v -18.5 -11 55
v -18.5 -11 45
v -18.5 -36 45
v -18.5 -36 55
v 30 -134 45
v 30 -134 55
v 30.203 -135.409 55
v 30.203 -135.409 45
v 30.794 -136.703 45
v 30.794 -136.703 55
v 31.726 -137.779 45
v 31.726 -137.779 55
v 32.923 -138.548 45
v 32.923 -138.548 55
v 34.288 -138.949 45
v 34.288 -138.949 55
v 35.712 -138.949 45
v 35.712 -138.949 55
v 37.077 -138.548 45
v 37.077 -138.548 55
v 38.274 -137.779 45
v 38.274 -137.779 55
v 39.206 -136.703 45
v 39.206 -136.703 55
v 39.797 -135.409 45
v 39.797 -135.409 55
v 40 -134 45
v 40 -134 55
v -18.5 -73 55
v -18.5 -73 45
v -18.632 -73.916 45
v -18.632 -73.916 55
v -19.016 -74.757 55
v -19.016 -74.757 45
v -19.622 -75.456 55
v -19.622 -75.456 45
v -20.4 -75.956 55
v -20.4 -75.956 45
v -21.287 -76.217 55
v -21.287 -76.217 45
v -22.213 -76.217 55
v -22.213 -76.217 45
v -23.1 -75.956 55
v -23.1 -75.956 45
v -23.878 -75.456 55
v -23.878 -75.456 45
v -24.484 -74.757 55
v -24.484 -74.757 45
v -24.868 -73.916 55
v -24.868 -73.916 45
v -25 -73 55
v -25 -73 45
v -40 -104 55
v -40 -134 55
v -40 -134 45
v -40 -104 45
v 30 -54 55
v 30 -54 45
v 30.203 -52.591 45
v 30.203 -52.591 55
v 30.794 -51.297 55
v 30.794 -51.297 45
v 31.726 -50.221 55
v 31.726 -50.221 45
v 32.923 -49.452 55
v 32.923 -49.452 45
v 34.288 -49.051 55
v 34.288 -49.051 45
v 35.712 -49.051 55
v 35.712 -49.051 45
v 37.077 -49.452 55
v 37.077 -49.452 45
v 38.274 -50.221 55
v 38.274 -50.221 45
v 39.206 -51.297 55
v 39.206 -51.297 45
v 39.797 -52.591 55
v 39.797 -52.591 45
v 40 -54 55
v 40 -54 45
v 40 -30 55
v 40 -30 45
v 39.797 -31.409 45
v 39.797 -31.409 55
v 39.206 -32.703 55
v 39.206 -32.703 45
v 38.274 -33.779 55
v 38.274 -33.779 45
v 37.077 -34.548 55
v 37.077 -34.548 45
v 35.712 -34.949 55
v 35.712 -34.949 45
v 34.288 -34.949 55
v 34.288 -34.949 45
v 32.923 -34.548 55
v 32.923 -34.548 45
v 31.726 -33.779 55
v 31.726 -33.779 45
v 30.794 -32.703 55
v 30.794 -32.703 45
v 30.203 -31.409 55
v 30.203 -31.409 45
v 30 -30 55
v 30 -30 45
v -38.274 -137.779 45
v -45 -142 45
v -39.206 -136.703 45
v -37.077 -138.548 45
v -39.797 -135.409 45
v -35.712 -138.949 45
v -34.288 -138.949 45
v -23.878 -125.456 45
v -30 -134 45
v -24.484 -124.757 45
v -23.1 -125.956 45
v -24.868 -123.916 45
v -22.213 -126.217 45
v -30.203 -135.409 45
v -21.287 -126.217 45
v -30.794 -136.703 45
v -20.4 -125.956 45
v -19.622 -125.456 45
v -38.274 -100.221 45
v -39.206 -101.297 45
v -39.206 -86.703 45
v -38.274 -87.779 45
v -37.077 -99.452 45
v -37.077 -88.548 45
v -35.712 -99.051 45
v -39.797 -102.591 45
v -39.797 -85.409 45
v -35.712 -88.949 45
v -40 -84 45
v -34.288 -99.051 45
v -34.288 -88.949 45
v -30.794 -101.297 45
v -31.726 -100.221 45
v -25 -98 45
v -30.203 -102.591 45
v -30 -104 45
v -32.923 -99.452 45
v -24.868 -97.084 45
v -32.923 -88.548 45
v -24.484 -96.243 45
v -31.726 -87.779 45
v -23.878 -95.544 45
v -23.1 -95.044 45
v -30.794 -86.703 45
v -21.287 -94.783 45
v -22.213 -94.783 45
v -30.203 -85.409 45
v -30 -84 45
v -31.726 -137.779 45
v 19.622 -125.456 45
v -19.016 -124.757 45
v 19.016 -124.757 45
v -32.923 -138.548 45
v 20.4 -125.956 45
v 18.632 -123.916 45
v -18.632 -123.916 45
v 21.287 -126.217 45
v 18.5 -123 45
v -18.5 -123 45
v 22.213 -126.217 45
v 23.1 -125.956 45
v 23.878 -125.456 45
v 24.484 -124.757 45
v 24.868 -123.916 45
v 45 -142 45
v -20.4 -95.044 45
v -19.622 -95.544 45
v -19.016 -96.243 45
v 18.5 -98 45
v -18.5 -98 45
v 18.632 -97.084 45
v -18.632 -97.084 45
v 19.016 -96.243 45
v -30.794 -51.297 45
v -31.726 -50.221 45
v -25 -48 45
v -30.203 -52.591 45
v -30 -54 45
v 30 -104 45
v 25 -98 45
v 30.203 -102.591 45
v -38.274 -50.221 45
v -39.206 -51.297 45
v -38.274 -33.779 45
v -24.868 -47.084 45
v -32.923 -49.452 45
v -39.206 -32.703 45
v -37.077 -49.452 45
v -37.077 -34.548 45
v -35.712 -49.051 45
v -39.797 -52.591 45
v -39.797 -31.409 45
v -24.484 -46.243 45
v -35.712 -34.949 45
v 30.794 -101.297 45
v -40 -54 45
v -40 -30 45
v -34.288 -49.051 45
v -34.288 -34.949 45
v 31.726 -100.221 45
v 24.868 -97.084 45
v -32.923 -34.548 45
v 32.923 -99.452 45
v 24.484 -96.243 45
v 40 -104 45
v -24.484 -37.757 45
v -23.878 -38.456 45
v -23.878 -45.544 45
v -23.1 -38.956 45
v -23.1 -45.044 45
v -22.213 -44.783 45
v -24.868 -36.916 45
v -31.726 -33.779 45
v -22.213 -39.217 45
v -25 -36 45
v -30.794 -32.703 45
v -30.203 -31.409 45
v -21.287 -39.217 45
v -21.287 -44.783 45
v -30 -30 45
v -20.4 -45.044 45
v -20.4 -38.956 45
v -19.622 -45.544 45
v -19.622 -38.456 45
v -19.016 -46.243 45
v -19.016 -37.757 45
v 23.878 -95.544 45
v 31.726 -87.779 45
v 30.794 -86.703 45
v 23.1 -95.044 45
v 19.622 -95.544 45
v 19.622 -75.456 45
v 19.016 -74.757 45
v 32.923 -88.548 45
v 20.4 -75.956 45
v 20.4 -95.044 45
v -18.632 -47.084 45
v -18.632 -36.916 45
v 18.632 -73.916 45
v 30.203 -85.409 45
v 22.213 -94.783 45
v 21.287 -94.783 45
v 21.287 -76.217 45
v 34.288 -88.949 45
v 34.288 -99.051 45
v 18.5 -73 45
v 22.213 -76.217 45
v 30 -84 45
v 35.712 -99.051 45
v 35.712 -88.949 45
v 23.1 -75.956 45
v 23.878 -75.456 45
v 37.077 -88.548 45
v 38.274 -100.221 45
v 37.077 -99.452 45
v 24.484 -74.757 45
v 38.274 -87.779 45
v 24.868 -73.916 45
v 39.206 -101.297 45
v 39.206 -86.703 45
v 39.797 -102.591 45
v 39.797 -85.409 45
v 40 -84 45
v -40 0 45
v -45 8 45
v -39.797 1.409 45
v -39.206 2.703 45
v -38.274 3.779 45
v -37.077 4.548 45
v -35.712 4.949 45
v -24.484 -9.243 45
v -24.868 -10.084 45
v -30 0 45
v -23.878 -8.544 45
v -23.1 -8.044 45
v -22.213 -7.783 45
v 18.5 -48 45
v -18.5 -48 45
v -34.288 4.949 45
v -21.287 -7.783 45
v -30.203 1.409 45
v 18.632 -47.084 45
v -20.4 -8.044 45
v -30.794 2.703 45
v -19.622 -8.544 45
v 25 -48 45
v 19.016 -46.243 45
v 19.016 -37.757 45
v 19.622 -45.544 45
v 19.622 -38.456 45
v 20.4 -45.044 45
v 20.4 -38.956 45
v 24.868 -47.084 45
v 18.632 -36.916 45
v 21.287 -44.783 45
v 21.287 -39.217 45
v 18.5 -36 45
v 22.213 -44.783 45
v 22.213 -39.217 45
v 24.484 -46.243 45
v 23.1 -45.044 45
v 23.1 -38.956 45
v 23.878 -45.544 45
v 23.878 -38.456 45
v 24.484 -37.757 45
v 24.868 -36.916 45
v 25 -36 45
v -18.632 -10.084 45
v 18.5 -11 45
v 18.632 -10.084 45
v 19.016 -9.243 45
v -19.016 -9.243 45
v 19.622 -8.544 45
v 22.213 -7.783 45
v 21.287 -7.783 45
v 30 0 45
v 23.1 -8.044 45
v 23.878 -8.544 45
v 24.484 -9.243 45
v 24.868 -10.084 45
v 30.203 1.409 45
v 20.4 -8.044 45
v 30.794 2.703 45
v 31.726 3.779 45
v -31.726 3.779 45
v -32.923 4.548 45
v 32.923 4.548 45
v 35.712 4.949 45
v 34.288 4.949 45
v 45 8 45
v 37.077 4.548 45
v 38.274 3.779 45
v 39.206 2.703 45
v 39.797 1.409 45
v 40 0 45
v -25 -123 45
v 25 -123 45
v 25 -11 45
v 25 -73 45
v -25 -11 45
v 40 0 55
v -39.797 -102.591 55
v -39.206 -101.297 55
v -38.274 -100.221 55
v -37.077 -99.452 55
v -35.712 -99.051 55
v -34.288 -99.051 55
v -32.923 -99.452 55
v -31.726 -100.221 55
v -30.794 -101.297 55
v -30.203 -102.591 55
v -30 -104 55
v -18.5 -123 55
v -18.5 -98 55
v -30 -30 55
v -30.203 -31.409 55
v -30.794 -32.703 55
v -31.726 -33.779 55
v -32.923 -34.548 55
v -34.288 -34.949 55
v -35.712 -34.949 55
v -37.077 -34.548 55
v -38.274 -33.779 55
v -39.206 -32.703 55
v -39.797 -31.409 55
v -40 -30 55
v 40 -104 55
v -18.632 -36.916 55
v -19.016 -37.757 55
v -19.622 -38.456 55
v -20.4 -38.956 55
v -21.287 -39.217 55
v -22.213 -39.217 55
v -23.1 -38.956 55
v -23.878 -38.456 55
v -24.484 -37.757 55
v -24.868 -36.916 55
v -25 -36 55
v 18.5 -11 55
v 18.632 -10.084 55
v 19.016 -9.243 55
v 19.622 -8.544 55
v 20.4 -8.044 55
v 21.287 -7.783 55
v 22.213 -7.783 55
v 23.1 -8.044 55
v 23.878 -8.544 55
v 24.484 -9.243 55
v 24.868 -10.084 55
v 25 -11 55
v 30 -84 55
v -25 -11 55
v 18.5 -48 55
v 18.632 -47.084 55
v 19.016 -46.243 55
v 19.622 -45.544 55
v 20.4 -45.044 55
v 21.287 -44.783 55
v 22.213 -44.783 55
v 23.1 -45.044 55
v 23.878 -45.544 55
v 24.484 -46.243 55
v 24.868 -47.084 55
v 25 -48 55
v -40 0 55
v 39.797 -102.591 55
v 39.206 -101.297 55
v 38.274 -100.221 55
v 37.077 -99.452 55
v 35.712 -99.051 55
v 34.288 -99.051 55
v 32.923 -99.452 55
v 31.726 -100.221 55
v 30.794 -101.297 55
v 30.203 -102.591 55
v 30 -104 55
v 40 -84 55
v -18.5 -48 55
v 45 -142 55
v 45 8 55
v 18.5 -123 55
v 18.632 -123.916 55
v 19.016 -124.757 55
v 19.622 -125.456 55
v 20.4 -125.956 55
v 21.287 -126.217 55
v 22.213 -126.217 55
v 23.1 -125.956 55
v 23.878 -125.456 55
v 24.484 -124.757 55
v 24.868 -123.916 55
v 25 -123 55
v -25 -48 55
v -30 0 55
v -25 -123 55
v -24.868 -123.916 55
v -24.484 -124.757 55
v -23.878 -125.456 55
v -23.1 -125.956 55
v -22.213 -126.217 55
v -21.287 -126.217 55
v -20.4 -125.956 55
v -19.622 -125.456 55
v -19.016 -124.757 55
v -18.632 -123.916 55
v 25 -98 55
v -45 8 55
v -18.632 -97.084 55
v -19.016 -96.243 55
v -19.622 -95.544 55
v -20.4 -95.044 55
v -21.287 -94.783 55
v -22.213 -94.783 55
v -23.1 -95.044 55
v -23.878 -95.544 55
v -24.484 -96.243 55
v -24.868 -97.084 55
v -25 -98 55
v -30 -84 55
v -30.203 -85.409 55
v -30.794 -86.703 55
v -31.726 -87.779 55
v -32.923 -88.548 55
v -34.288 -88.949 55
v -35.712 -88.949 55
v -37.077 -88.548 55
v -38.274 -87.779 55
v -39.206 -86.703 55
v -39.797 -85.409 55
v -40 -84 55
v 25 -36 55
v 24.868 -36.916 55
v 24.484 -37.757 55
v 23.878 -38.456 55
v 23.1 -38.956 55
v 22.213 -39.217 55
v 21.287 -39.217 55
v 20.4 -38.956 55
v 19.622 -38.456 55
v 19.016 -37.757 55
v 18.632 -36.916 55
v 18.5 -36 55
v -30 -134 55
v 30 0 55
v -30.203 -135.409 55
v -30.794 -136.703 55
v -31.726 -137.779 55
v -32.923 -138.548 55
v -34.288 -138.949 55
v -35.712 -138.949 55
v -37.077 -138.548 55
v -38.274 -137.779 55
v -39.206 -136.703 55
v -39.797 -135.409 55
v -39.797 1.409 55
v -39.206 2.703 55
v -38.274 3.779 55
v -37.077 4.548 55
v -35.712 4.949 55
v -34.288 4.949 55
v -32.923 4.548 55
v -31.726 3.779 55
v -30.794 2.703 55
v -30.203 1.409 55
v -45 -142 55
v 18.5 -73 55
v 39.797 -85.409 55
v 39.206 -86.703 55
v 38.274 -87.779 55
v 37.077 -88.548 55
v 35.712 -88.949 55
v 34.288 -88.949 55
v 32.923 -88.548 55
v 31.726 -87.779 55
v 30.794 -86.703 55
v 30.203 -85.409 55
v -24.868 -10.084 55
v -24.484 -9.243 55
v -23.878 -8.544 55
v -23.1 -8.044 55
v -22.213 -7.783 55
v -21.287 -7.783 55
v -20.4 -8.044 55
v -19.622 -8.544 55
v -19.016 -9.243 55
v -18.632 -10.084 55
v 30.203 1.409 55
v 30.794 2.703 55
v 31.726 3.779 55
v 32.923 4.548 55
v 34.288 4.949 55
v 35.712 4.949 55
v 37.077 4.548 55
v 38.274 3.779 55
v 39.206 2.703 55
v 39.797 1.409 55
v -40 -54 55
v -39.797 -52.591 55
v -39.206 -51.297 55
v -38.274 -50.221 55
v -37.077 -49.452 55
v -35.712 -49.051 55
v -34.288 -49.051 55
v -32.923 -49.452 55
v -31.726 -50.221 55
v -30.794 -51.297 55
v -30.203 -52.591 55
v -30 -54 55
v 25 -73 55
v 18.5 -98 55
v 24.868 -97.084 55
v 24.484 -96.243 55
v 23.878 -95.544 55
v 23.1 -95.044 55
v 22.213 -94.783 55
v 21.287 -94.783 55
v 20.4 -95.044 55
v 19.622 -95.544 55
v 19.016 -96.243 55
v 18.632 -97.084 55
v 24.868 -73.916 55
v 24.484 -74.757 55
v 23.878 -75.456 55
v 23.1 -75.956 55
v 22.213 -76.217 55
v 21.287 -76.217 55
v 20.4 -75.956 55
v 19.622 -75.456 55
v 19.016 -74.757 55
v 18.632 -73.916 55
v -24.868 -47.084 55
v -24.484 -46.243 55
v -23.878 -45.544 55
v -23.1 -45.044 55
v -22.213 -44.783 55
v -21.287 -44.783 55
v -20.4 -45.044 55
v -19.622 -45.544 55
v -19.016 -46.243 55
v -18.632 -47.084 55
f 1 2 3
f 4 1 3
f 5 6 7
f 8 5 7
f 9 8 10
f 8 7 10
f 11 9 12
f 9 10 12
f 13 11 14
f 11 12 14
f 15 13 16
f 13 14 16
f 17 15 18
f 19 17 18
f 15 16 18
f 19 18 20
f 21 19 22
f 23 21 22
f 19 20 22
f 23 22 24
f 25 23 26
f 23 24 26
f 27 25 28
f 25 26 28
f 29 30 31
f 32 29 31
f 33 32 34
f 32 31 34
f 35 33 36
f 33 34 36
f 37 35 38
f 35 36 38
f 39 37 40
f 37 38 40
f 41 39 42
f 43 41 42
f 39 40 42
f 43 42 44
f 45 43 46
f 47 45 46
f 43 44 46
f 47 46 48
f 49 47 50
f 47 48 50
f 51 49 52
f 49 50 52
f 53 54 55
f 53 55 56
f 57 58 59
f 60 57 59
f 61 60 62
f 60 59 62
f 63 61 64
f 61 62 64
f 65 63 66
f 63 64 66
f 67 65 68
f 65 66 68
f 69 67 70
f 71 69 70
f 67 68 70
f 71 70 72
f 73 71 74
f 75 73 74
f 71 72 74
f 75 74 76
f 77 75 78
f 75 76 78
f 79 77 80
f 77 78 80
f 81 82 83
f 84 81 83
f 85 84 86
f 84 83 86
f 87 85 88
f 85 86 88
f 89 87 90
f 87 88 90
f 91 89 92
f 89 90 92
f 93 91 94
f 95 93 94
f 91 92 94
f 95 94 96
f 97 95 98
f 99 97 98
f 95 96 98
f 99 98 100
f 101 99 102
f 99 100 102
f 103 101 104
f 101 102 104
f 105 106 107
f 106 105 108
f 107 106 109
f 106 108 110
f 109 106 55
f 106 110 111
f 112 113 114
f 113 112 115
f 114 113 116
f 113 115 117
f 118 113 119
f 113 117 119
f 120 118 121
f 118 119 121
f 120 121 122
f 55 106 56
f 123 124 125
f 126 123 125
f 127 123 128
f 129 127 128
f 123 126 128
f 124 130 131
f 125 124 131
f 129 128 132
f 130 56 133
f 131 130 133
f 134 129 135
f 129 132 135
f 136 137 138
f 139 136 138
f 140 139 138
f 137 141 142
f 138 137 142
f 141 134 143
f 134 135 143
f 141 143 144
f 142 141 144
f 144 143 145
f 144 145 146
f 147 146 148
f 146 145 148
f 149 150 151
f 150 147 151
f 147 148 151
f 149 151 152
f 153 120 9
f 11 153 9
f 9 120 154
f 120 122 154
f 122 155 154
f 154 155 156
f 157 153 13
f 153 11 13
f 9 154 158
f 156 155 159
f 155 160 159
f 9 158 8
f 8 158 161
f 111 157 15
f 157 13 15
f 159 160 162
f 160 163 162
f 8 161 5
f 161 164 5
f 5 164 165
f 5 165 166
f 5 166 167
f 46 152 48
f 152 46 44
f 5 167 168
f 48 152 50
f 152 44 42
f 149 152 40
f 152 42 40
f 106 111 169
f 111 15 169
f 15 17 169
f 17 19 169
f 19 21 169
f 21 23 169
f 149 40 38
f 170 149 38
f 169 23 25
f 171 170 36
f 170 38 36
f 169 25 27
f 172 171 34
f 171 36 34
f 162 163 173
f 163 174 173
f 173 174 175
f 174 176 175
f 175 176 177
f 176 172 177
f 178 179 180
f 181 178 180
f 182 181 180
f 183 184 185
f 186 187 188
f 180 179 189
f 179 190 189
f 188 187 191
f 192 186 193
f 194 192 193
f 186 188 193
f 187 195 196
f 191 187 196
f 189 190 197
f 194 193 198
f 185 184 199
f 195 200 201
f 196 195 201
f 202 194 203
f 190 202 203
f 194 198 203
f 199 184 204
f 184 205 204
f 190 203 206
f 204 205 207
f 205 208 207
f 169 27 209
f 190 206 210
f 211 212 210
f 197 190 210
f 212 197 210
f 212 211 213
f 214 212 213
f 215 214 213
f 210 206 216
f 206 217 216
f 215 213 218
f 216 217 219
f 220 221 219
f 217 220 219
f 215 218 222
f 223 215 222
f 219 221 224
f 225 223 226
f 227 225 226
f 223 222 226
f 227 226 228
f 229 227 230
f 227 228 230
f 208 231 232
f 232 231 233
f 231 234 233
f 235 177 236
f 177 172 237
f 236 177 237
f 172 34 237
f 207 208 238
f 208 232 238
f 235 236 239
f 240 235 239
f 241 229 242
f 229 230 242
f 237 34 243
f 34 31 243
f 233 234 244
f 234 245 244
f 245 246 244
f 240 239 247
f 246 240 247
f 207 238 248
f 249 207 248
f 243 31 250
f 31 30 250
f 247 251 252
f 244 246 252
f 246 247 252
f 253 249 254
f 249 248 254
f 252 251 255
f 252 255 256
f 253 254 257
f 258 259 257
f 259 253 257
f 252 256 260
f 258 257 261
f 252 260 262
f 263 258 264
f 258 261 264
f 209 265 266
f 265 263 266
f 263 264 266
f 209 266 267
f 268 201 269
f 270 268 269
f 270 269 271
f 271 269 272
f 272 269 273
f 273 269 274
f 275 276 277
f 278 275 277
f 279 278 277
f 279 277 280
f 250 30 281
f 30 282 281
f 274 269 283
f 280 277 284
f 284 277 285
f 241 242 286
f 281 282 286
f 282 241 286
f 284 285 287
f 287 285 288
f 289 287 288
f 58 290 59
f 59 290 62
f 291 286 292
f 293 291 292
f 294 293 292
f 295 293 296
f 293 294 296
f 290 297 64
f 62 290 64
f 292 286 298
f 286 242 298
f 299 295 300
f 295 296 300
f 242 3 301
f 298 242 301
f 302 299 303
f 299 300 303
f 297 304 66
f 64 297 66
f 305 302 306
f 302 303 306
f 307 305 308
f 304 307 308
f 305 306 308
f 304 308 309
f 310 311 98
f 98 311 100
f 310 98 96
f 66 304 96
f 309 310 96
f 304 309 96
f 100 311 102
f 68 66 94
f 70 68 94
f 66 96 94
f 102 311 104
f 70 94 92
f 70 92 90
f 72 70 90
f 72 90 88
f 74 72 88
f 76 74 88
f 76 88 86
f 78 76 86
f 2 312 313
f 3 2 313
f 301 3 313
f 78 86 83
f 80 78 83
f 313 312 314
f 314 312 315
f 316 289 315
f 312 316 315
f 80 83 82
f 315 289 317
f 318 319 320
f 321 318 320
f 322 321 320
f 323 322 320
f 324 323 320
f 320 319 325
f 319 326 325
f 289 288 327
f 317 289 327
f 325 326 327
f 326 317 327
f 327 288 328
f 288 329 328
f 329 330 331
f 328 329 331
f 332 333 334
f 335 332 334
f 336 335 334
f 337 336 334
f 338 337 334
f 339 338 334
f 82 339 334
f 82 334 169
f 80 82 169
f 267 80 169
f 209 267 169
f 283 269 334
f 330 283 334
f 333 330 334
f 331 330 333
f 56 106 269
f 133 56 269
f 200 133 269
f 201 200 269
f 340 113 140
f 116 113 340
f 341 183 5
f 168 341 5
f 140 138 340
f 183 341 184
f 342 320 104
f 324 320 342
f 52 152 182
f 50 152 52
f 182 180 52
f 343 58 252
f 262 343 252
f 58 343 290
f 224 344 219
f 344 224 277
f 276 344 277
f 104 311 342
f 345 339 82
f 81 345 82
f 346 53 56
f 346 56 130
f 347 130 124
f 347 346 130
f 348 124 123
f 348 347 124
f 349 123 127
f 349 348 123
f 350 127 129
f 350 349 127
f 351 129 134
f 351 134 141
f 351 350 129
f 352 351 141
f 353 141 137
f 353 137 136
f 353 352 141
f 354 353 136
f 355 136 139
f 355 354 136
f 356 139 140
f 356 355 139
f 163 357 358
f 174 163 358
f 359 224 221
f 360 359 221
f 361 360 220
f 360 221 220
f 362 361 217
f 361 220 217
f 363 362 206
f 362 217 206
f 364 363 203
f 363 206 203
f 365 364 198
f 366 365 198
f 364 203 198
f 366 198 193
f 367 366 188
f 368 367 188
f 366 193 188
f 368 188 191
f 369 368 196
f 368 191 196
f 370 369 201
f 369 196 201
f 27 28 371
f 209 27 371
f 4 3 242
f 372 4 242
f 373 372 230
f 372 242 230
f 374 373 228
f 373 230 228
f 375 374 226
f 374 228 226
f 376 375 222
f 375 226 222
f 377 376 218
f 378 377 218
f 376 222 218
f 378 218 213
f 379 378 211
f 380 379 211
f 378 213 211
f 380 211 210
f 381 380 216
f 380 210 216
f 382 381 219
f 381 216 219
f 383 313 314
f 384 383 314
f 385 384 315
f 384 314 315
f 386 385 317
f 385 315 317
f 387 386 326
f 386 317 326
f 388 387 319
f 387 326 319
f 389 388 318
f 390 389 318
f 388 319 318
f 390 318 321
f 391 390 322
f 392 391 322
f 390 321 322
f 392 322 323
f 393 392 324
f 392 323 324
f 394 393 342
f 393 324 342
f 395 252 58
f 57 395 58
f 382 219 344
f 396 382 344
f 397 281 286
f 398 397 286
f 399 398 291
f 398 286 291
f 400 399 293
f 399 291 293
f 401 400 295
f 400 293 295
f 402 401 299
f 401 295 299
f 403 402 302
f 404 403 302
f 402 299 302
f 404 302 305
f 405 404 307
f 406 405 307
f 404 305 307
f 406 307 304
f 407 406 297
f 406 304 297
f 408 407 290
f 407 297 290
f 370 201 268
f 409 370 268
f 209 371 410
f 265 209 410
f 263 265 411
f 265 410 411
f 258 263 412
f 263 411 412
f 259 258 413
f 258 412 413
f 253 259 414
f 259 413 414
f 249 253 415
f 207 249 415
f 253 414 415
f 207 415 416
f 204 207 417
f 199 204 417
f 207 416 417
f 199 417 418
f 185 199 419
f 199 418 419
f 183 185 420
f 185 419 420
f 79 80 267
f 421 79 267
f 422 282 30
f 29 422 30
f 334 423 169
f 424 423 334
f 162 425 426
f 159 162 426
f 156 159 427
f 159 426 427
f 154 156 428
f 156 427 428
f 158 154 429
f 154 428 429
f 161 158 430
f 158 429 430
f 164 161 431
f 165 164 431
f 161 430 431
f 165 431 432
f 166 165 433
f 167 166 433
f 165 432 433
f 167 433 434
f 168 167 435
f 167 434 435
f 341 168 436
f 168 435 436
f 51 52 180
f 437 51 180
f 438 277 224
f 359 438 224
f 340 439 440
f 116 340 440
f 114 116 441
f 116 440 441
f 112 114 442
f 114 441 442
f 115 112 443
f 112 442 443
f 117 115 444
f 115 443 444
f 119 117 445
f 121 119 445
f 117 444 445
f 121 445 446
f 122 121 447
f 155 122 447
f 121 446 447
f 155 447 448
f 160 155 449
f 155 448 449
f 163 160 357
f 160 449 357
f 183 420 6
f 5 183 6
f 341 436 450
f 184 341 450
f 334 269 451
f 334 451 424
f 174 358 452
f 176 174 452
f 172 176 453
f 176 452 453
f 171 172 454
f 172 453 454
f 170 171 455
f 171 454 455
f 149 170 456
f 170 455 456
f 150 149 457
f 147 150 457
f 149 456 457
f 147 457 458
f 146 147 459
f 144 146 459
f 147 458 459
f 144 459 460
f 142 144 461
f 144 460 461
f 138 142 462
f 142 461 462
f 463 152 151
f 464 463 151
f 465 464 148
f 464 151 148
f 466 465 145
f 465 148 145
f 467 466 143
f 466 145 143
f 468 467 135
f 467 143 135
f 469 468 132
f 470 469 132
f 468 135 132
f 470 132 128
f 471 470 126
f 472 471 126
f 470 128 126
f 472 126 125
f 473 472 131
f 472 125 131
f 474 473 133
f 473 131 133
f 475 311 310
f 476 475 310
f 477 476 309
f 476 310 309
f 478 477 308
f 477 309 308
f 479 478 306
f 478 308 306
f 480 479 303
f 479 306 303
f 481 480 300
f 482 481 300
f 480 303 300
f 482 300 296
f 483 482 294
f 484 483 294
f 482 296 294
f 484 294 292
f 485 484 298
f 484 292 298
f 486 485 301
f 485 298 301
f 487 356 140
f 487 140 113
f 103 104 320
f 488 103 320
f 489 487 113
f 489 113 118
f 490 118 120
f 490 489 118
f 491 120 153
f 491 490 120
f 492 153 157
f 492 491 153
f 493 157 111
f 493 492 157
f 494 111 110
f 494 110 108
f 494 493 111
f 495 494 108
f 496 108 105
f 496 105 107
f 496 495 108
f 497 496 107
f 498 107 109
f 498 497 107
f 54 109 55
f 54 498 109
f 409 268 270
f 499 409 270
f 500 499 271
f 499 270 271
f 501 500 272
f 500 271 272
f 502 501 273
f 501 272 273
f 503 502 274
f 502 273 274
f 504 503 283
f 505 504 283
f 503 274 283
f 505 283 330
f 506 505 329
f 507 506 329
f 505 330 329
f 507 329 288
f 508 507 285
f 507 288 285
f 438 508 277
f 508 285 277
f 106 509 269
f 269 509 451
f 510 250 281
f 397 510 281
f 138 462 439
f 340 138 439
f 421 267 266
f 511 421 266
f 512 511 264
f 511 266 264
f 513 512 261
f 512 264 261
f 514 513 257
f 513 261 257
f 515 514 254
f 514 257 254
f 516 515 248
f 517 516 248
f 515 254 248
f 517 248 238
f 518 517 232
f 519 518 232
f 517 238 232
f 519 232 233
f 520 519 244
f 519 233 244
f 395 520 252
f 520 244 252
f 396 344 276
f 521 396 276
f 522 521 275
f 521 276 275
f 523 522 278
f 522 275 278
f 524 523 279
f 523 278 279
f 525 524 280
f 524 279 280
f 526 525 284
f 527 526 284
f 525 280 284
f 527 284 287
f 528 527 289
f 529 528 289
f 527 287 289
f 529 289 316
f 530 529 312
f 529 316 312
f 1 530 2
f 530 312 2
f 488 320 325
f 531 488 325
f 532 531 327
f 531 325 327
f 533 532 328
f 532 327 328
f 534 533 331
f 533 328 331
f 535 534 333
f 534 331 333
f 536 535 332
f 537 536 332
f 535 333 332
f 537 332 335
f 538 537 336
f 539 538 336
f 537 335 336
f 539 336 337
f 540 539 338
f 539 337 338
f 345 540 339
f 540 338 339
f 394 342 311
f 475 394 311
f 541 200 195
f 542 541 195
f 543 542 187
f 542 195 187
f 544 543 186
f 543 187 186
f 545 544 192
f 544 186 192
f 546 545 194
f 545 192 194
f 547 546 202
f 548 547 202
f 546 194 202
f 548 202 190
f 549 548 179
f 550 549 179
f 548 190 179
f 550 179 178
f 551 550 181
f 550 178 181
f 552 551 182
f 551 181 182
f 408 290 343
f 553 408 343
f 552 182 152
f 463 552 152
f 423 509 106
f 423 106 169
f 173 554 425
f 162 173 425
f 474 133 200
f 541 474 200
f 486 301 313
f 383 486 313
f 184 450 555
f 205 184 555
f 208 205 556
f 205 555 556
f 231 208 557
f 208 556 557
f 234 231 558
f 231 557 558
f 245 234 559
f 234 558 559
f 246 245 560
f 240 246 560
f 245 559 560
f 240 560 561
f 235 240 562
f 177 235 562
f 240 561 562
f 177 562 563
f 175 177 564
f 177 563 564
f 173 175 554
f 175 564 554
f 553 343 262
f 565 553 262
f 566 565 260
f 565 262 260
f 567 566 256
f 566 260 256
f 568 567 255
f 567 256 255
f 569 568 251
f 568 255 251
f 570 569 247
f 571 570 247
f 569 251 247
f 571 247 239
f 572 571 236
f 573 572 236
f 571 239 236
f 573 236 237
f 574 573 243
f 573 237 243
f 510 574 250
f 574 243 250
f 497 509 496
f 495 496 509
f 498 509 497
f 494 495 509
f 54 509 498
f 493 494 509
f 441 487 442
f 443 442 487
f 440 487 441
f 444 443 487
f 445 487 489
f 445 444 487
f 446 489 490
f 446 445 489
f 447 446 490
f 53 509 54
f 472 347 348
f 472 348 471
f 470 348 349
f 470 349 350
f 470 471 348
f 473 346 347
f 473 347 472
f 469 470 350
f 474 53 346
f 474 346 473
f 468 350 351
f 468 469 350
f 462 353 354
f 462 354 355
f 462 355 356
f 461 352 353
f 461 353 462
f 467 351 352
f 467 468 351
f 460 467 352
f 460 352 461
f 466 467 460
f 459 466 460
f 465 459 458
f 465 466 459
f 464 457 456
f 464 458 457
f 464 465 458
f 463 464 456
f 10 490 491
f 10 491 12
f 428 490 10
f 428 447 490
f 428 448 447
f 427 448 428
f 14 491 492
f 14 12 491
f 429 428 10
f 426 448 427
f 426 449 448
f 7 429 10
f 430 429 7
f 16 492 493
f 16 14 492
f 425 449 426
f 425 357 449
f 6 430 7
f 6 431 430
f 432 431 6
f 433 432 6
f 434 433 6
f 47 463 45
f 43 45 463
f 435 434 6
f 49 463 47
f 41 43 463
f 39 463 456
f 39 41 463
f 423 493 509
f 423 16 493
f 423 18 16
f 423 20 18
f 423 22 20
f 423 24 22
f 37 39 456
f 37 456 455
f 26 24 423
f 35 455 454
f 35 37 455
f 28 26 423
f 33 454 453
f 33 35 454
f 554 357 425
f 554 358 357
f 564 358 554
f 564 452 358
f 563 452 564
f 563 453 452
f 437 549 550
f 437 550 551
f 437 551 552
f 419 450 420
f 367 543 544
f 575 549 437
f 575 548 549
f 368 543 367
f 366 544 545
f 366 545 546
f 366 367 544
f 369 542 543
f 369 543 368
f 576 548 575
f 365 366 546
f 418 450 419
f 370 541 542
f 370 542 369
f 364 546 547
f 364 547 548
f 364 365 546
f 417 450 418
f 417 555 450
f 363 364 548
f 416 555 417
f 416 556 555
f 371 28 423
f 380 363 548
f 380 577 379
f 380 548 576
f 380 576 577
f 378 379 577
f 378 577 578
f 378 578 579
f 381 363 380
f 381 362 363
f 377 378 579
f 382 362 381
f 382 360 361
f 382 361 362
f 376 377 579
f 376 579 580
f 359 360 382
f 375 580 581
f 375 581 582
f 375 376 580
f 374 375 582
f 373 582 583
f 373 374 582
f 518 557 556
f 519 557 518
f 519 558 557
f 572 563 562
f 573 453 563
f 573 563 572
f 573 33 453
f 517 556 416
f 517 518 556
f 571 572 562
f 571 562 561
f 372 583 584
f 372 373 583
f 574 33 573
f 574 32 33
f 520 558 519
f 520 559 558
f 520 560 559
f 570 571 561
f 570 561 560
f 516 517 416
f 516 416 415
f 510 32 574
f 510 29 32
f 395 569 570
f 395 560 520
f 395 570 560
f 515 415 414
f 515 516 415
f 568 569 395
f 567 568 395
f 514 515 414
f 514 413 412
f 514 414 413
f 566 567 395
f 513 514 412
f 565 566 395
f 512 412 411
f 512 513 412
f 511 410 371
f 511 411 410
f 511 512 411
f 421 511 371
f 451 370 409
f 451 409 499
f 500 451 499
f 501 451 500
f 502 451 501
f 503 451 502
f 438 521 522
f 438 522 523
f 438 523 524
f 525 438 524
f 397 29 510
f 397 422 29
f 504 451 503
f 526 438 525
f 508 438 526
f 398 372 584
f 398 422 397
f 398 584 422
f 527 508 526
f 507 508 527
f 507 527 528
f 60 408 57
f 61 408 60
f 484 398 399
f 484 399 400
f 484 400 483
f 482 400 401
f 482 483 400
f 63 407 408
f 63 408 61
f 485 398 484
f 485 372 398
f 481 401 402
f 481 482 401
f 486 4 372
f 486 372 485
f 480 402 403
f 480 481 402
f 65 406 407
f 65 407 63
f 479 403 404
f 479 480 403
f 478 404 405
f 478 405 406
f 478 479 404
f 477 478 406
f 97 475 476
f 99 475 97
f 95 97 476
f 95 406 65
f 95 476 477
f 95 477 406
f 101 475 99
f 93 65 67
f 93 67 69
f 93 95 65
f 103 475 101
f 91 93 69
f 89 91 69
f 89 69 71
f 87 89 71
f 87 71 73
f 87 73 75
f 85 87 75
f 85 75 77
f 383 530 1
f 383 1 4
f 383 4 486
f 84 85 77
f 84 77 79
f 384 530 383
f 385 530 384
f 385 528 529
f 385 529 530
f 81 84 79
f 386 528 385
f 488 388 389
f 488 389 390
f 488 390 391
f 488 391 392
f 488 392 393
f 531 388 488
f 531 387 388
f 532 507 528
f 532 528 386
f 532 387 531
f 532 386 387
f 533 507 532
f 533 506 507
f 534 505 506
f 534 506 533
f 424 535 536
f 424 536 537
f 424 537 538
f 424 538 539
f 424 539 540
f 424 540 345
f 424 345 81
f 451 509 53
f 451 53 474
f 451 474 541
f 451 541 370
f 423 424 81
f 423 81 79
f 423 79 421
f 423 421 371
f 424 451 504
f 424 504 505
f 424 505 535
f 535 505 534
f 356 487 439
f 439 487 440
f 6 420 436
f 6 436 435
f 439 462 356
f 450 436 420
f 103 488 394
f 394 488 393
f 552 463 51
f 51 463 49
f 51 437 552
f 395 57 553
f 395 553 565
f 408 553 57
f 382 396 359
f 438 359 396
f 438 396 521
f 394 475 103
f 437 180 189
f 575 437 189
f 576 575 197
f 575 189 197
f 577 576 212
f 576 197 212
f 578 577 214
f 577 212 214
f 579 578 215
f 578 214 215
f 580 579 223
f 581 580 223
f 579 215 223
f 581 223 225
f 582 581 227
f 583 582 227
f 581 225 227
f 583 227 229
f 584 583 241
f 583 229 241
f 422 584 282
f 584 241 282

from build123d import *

# Parameters (mm, degrees)
SPLIT_START       = 45
SPLIT_1_OUTLINE_W = 90
SPLIT_1_OUTLINE_H = 100
SPLIT_1_DEPTH     = 10
SKETCH_1_W        = 90
SKETCH_1_H        = 50
EXTRUDE_1_DEPTH   = 10


# Read off the part's stored shape, not the designer's step: 基材零件-專題-1
with BuildPart() as part:
    # Split 1 outline → Split 1 (new body)
    with BuildSketch(Plane.XY.offset(SPLIT_START)):
        with Locations((0, -42)):
            Rectangle(SPLIT_1_OUTLINE_W, SPLIT_1_OUTLINE_H)
        with BuildLine():
            Line((-40, -84), (-40, -54))
            ThreePointArc((-40, -54), (-35, -49), (-30, -54))
            Line((-30, -54), (-30, -84))
            ThreePointArc((-30, -84), (-35, -89), (-40, -84))
        make_face(mode=Mode.SUBTRACT)
        with BuildLine():
            Line((-25, -73), (-25, -48))
            ThreePointArc((-25, -48), (-21.75, -44.75), (-18.5, -48))
            Line((-18.5, -48), (-18.5, -73))
            ThreePointArc((-18.5, -73), (-21.75, -76.25), (-25, -73))
        make_face(mode=Mode.SUBTRACT)
        with BuildLine():
            Line((30, -84), (30, -54))
            ThreePointArc((30, -54), (35, -49), (40, -54))
            Line((40, -54), (40, -84))
            ThreePointArc((40, -84), (35, -89), (30, -84))
        make_face(mode=Mode.SUBTRACT)
        with BuildLine():
            Line((18.5, -73), (18.5, -48))
            ThreePointArc((18.5, -48), (21.75, -44.75), (25, -48))
            Line((25, -48), (25, -73))
            ThreePointArc((25, -73), (21.75, -76.25), (18.5, -73))
        make_face(mode=Mode.SUBTRACT)
        with BuildLine():
            Line((-18.5, -11), (-18.5, -36))
            ThreePointArc((-18.5, -36), (-21.75, -39.25), (-25, -36))
            Line((-25, -36), (-25, -11))
            ThreePointArc((-25, -11), (-21.75, -7.75), (-18.5, -11))
        make_face(mode=Mode.SUBTRACT)
        with BuildLine():
            ThreePointArc((-30, -30), (-35, -35), (-40, -30))
            Line((-40, -30), (-40, 0))
            ThreePointArc((-40, 0), (-35, 5), (-30, 0))
            Line((-30, 0), (-30, -30))
        make_face(mode=Mode.SUBTRACT)
        with BuildLine():
            Line((25, -11), (25, -36))
            ThreePointArc((25, -36), (21.75, -39.25), (18.5, -36))
            Line((18.5, -36), (18.5, -11))
            ThreePointArc((18.5, -11), (21.75, -7.75), (25, -11))
        make_face(mode=Mode.SUBTRACT)
        with BuildLine():
            ThreePointArc((40, -30), (35, -35), (30, -30))
            Line((30, -30), (30, 0))
            ThreePointArc((30, 0), (35, 5), (40, 0))
            Line((40, 0), (40, -30))
        make_face(mode=Mode.SUBTRACT)
    extrude(amount=SPLIT_1_DEPTH)

    # 草圖1 → 填料-伸長1 (add)
    with BuildSketch(Plane.XY.offset(55)):
        with Locations((0, -117)):
            Rectangle(SKETCH_1_W, SKETCH_1_H)
        with BuildLine():
            Line((40, -134), (40, -104))
            ThreePointArc((40, -104), (35, -99), (30, -104))
            Line((30, -104), (30, -134))
            ThreePointArc((30, -134), (35, -139), (40, -134))
        make_face(mode=Mode.SUBTRACT)
        with BuildLine():
            Line((25, -123), (25, -98))
            ThreePointArc((25, -98), (21.75, -94.75), (18.5, -98))
            Line((18.5, -98), (18.5, -123))
            ThreePointArc((18.5, -123), (21.75, -126.25), (25, -123))
        make_face(mode=Mode.SUBTRACT)
        with BuildLine():
            Line((-18.5, -123), (-18.5, -98))
            ThreePointArc((-18.5, -98), (-21.75, -94.75), (-25, -98))
            Line((-25, -98), (-25, -123))
            ThreePointArc((-25, -123), (-21.75, -126.25), (-18.5, -123))
        make_face(mode=Mode.SUBTRACT)
        with BuildLine():
            Line((-40, -134), (-40, -104))
            ThreePointArc((-40, -104), (-35, -99), (-30, -104))
            Line((-30, -104), (-30, -134))
            ThreePointArc((-30, -134), (-35, -139), (-40, -134))
        make_face(mode=Mode.SUBTRACT)
    extrude(amount=-EXTRUDE_1_DEPTH)


solid = part.part
